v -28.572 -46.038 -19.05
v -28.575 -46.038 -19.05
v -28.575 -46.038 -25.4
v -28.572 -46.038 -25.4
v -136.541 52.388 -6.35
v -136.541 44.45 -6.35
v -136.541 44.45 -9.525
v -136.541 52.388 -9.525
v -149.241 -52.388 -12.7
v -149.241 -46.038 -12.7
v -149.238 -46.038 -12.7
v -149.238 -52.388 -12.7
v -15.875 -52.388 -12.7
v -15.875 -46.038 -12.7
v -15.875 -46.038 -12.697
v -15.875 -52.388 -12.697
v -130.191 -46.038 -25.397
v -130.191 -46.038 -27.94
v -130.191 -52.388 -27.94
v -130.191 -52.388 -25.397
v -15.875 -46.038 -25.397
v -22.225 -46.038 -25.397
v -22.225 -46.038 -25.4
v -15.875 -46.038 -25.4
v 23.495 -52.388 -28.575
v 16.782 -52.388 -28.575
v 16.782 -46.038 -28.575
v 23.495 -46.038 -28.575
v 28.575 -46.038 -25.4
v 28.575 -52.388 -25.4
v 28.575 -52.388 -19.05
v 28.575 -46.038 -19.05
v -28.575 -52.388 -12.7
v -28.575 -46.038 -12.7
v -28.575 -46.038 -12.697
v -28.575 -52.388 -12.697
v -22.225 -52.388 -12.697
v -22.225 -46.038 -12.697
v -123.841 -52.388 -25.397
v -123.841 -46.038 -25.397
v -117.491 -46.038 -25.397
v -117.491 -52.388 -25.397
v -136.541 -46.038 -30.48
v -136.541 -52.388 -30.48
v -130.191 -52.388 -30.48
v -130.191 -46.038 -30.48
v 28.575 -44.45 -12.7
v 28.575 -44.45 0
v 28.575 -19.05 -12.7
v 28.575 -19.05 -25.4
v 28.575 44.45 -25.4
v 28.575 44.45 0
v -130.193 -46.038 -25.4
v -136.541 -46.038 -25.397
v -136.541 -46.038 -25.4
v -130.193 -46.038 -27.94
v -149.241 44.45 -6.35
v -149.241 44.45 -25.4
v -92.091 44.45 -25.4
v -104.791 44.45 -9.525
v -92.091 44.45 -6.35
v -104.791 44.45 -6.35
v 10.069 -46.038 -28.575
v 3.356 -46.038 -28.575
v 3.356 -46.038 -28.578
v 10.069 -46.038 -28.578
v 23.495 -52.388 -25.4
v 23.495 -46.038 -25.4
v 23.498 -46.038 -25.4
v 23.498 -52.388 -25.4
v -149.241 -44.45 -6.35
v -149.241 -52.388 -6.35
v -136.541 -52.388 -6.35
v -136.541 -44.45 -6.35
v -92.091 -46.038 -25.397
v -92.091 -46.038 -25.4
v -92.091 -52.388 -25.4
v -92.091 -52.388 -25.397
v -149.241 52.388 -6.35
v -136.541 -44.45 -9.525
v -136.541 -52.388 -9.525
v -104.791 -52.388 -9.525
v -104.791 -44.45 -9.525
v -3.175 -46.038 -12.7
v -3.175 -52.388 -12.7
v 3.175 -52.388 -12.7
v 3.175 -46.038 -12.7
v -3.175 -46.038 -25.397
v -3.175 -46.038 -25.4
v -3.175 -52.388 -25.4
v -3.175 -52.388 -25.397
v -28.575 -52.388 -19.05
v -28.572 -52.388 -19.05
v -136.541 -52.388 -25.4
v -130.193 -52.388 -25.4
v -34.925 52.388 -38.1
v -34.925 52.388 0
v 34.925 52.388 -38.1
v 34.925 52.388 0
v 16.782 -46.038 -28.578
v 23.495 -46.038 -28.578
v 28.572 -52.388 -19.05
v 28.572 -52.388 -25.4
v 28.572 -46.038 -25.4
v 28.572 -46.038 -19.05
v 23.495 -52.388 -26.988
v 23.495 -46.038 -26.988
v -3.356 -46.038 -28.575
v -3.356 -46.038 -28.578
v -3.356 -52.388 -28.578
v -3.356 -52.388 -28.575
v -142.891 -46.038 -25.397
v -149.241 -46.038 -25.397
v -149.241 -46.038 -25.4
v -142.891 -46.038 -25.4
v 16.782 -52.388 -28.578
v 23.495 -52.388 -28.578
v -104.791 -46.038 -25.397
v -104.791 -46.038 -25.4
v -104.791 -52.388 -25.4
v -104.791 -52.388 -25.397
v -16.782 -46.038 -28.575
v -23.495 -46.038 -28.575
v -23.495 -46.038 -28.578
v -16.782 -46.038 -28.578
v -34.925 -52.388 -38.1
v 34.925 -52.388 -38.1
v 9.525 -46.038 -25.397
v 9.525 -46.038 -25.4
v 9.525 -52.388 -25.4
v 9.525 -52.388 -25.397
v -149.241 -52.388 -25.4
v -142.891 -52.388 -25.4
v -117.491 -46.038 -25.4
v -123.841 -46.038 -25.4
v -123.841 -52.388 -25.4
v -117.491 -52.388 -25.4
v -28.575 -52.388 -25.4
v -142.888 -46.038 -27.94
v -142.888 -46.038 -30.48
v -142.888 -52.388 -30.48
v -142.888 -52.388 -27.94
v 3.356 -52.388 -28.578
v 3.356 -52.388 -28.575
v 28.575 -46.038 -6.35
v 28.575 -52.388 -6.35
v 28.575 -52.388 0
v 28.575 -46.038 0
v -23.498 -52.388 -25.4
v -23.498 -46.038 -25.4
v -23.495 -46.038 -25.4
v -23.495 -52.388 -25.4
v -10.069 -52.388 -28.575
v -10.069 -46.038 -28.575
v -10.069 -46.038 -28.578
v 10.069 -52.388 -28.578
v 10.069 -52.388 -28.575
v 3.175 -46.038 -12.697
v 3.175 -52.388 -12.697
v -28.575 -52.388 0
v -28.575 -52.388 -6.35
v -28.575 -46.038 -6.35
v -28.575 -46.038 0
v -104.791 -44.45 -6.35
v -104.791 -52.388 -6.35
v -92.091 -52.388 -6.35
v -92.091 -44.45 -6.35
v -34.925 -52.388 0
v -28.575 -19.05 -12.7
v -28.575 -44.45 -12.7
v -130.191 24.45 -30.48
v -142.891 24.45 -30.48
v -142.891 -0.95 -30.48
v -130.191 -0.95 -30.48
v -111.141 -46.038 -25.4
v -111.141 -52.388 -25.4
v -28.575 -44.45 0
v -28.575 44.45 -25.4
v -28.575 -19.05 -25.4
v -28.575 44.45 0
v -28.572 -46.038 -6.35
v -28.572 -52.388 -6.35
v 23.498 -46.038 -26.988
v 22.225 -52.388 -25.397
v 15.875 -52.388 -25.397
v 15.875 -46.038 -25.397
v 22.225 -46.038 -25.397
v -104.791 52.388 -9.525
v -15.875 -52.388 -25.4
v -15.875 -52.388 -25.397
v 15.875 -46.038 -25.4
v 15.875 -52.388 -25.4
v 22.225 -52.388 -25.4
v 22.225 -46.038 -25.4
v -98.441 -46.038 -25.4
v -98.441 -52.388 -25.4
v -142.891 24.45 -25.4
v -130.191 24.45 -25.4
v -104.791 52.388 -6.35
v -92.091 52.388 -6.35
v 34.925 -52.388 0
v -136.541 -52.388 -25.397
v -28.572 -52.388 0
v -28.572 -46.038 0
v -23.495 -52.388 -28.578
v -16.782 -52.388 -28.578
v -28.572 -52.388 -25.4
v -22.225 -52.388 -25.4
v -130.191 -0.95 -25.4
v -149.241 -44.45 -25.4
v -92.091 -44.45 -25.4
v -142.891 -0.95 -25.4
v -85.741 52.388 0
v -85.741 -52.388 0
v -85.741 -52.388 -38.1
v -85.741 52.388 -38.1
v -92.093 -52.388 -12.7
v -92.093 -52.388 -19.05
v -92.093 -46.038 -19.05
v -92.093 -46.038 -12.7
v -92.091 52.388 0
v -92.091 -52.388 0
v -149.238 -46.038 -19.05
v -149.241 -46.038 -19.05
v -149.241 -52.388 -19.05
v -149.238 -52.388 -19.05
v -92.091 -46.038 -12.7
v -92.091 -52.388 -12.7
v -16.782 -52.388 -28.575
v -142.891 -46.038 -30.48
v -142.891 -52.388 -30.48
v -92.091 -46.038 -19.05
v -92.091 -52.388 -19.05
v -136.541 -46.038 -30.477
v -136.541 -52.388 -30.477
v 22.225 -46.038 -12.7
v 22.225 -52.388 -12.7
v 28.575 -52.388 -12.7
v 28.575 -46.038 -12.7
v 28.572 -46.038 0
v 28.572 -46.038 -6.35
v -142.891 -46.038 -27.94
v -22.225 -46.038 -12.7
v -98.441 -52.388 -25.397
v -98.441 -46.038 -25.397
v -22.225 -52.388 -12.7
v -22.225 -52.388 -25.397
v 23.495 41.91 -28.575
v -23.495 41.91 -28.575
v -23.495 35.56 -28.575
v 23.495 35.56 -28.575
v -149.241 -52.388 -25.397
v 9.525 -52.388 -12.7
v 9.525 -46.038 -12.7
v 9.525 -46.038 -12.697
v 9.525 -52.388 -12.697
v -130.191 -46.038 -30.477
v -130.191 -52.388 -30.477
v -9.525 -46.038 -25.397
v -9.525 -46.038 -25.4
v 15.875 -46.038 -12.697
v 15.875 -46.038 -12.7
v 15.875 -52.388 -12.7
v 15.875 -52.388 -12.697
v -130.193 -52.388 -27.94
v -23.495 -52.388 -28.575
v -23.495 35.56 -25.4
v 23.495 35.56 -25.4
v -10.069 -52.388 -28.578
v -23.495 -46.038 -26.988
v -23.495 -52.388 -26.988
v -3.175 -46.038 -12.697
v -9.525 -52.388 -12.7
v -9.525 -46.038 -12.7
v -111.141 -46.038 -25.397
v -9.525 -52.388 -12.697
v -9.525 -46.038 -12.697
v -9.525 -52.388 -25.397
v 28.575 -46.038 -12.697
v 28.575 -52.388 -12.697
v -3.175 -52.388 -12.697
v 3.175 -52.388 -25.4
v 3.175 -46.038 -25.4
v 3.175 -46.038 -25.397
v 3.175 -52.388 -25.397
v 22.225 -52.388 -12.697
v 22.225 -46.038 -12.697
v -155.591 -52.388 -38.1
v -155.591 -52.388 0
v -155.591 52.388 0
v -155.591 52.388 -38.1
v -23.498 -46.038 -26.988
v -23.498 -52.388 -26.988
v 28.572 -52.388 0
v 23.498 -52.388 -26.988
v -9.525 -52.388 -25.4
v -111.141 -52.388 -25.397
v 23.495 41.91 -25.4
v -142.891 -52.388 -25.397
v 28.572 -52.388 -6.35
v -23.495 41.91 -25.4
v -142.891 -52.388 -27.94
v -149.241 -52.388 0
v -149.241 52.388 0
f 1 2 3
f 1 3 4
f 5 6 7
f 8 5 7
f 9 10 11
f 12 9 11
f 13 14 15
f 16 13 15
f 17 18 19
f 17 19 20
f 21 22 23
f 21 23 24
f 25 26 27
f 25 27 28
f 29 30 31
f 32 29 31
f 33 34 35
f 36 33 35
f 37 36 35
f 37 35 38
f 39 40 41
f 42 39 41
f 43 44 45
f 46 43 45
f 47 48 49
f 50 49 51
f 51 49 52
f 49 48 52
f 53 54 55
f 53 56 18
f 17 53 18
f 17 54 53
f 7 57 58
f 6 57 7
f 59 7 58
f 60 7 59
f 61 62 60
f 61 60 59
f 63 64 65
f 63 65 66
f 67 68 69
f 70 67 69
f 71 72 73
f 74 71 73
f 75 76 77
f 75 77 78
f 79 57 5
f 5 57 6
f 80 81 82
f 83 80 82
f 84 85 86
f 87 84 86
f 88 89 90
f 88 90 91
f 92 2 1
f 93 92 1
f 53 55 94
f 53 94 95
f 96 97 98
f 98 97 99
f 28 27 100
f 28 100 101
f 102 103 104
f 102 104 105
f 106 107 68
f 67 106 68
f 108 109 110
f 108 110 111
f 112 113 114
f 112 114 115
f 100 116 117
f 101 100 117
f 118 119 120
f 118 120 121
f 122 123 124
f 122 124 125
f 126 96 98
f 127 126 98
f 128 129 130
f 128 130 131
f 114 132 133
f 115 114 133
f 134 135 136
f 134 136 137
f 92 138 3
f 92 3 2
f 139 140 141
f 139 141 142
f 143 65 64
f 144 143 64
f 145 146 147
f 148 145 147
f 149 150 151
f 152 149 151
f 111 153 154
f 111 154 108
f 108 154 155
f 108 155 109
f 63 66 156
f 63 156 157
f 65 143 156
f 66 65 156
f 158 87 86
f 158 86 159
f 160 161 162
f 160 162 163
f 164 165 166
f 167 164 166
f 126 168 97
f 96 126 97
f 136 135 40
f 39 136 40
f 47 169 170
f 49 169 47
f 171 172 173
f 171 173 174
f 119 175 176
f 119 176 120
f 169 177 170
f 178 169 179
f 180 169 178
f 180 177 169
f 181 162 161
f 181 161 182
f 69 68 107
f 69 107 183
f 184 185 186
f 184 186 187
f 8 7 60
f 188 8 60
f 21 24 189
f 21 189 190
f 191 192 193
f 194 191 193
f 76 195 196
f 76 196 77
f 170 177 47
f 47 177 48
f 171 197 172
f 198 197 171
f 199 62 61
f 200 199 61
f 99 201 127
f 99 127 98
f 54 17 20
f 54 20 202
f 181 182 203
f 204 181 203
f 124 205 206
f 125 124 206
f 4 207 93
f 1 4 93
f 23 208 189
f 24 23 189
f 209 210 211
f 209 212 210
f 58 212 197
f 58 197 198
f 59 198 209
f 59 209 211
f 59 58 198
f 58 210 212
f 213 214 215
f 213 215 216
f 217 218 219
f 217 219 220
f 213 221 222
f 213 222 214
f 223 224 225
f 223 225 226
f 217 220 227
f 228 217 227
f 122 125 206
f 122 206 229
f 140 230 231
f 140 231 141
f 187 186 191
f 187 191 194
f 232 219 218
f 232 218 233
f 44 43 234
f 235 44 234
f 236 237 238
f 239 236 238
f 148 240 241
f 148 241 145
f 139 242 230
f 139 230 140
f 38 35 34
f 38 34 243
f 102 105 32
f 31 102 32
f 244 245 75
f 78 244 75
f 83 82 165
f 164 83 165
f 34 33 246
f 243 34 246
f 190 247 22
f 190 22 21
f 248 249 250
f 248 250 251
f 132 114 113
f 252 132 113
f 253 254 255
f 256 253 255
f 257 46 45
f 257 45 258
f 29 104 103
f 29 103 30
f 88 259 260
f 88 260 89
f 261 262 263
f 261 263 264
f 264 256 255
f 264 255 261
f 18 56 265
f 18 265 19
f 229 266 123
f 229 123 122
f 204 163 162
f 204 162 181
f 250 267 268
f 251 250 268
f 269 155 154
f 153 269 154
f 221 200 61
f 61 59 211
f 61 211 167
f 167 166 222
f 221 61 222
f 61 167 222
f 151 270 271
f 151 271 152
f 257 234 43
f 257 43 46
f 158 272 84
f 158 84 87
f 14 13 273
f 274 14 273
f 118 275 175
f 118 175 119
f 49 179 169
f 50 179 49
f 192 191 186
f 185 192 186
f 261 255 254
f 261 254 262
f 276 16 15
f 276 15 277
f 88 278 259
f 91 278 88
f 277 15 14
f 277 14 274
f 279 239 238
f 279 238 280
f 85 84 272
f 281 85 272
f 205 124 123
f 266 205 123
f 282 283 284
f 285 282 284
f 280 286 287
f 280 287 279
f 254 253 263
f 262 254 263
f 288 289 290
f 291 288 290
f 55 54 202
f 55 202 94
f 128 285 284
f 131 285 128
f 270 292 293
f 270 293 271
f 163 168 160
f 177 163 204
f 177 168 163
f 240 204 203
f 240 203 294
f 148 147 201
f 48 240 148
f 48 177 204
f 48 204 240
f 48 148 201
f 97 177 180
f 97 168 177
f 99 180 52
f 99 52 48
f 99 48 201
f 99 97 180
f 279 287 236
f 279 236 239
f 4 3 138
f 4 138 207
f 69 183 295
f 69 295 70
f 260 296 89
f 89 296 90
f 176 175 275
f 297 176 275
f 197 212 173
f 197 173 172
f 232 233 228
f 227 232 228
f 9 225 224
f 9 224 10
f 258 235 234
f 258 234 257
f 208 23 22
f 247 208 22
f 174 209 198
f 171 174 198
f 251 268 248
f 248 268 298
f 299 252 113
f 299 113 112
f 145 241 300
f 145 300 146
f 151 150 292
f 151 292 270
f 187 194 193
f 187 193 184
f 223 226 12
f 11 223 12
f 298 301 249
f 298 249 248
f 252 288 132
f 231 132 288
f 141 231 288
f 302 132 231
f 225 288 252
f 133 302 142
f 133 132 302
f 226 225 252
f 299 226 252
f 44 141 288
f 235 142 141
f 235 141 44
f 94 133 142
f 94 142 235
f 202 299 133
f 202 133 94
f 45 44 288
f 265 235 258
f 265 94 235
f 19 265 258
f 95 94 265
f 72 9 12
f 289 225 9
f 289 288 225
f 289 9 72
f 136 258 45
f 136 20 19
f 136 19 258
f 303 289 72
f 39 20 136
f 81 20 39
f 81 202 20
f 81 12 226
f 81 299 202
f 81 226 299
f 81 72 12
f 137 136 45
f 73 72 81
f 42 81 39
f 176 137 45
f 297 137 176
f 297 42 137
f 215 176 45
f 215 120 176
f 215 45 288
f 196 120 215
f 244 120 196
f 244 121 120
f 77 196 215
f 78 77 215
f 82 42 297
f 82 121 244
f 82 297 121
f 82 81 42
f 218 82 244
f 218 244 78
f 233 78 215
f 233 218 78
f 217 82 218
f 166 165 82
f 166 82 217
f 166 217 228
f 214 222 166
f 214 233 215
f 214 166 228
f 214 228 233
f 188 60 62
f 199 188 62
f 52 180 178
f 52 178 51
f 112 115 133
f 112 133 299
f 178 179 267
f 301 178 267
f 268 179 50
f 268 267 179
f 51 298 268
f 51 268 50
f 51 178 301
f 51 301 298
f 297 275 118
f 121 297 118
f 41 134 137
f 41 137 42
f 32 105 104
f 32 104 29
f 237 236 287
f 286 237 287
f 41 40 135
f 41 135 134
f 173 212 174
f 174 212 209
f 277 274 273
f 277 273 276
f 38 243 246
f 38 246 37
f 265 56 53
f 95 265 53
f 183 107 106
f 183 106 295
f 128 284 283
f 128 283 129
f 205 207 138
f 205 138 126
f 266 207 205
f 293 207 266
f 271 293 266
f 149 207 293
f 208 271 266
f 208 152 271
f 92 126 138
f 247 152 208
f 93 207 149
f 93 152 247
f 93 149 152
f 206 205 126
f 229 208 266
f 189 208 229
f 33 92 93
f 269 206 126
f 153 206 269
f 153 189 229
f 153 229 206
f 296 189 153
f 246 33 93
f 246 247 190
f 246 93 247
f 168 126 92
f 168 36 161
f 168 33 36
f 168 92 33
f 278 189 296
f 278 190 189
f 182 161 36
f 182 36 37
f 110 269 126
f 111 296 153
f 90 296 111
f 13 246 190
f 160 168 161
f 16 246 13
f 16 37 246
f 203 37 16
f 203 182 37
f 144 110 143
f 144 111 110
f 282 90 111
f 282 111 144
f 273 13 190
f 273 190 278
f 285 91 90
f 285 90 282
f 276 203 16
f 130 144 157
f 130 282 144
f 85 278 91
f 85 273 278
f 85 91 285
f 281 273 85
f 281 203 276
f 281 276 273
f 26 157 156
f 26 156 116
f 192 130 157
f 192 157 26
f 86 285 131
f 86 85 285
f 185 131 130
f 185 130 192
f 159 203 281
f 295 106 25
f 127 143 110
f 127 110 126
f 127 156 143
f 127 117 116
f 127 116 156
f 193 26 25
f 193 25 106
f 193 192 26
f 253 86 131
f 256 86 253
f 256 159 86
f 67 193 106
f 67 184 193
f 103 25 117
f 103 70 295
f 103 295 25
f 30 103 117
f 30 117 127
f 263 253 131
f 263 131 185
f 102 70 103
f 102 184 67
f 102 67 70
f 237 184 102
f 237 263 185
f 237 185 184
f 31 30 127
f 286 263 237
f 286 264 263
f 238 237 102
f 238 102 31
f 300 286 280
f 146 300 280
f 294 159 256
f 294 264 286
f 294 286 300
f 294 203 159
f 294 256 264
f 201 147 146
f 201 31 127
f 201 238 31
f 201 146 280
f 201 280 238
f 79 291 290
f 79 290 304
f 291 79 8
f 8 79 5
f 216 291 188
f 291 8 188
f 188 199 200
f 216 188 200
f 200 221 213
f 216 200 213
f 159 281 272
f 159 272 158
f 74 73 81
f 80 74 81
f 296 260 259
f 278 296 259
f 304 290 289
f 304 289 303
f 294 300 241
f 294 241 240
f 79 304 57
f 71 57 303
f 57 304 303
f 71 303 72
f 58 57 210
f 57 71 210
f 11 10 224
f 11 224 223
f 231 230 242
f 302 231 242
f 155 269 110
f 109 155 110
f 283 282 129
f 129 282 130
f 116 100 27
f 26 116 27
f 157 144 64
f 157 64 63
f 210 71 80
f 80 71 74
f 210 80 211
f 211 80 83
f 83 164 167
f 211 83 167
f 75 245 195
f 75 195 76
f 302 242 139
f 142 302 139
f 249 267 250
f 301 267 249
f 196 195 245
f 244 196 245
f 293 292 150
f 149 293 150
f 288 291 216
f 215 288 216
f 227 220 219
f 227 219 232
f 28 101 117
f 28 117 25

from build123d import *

# Parameters (mm, degrees)
F0_W      = 69.85
F0_H      = 104.775
F1_DEPTH  = 38.1
F2_W      = 57.15
F2_H      = 88.9
F3_DEPTH  = 25.4
F4_W      = 57.15
F4_H      = 25.4
F5_DEPTH  = 12.7
F6_DEPTH  = 25.4
F8_DEPTH  = 104.776
F9_W      = 12.7
F9_H      = 25.4
F10_DEPTH = 5.08
F11_W     = 46.99
F11_H     = 6.35
F12_DEPTH = 3.175
F13_W     = 6.35
F13_H     = 0.00254
F13_W_2   = 0.00254
F13_H_2   = 6.35
F13_H_3   = 1.5875
F13_W_3   = 6.7128571429
F14_DEPTH = 6.35
F15_W     = 6.35
F15_H     = 0.00254
F15_W_2   = 0.00254
F15_H_2   = 2.54
F15_H_3   = 6.35
F16_DEPTH = 6.35
F17_DEPTH = 6.35


with BuildPart() as f1:
    # F0 (on Top) → F1 (new body)
    with BuildSketch(Plane.XY):
        Rectangle(F0_W, F0_H)
    extrude(amount=-F1_DEPTH)

    # F2 (on Top) → F3 (cut)
    with BuildSketch(Plane.XY):
        Rectangle(F2_W, F2_H)
    extrude(amount=-F3_DEPTH, mode=Mode.SUBTRACT)

    # F4 (on face) → F5 (join)
    with BuildSketch(Plane.XY.offset(-25.4)):
        with Locations((0, -31.75)):
            Rectangle(F4_W, F4_H)
    extrude(amount=F5_DEPTH)

    # F11 (on face) → F12 (cut)
    with BuildSketch(Plane.XY.offset(-25.4)):
        with Locations((0, 38.735)):
            Rectangle(F11_W, F11_H)
    extrude(amount=-F12_DEPTH, mode=Mode.SUBTRACT)

    # F13 (on face) → F14 (cut)
    with BuildSketch(Plane.XZ.offset(52.3875)):
        with Locations((-25.4, -12.69873)):
            Rectangle(F13_W, F13_H)
        with Locations((-12.7, -12.69873)):
            Rectangle(F13_W, F13_H)
        with Locations((0, -12.69873)):
            Rectangle(F13_W, F13_H)
        with Locations((12.7, -12.69873)):
            Rectangle(F13_W, F13_H)
        with Locations((25.4, -12.69873)):
            Rectangle(F13_W, F13_H)
        with Locations((-28.57373, -3.175)):
            Rectangle(F13_W_2, F13_H_2)
        with Locations((-28.57373, -22.225)):
            Rectangle(F13_W_2, F13_H_2)
        with Locations((28.57373, -3.175)):
            Rectangle(F13_W_2, F13_H_2)
        with Locations((28.57373, -22.225)):
            Rectangle(F13_W_2, F13_H_2)
        with Locations((-19.05, -25.39873)):
            Rectangle(F13_W, F13_H)
        with Locations((-6.35, -25.39873)):
            Rectangle(F13_W, F13_H)
        with Locations((6.35, -25.39873)):
            Rectangle(F13_W, F13_H)
        with Locations((19.05, -25.39873)):
            Rectangle(F13_W, F13_H)
        with Locations((-23.49627, -26.19375)):
            Rectangle(F13_W_2, F13_H_3)
        with Locations((23.49627, -26.19375)):
            Rectangle(F13_W_2, F13_H_3)
        with Locations((20.1385714286, -28.57627)):
            Rectangle(F13_W_3, F13_H)
        with Locations((6.7128571429, -28.57627)):
            Rectangle(F13_W_3, F13_H)
        with Locations((-6.7128571429, -28.57627)):
            Rectangle(F13_W_3, F13_H)
        with Locations((-20.1385714286, -28.57627)):
            Rectangle(F13_W_3, F13_H)
    extrude(amount=-F14_DEPTH, mode=Mode.SUBTRACT)

    # F13 (on face) → F17 (cut)
    with BuildSketch(Plane.XZ.offset(52.3875)):
        with Locations((-25.4, -12.69873)):
            Rectangle(F13_W, F13_H)
        with Locations((-12.7, -12.69873)):
            Rectangle(F13_W, F13_H)
        with Locations((0, -12.69873)):
            Rectangle(F13_W, F13_H)
        with Locations((12.7, -12.69873)):
            Rectangle(F13_W, F13_H)
        with Locations((25.4, -12.69873)):
            Rectangle(F13_W, F13_H)
        with Locations((-28.57373, -3.175)):
            Rectangle(F13_W_2, F13_H_2)
        with Locations((-28.57373, -22.225)):
            Rectangle(F13_W_2, F13_H_2)
        with Locations((28.57373, -3.175)):
            Rectangle(F13_W_2, F13_H_2)
        with Locations((28.57373, -22.225)):
            Rectangle(F13_W_2, F13_H_2)
        with Locations((-19.05, -25.39873)):
            Rectangle(F13_W, F13_H)
        with Locations((-6.35, -25.39873)):
            Rectangle(F13_W, F13_H)
        with Locations((6.35, -25.39873)):
            Rectangle(F13_W, F13_H)
        with Locations((19.05, -25.39873)):
            Rectangle(F13_W, F13_H)
        with Locations((-23.49627, -26.19375)):
            Rectangle(F13_W_2, F13_H_3)
        with Locations((23.49627, -26.19375)):
            Rectangle(F13_W_2, F13_H_3)
        with Locations((20.1385714286, -28.57627)):
            Rectangle(F13_W_3, F13_H)
        with Locations((6.7128571429, -28.57627)):
            Rectangle(F13_W_3, F13_H)
        with Locations((-6.7128571429, -28.57627)):
            Rectangle(F13_W_3, F13_H)
        with Locations((-20.1385714286, -28.57627)):
            Rectangle(F13_W_3, F13_H)
    extrude(amount=-F17_DEPTH, mode=Mode.SUBTRACT)


with BuildPart() as f1b:
    # F0 (on Top) → F1, piece 2 (new body)
    with BuildSketch(Plane.XY):
        with Locations((-120.6659083736, 0)):
            Rectangle(F0_W, F0_H)
    extrude(amount=-F1_DEPTH)

    # F2 (on Top) → F6 (cut)
    with BuildSketch(Plane.XY):
        Rectangle(F2_W, F2_H)
        with Locations((-120.6659083736, 0)):
            Rectangle(F2_W, F2_H)
    extrude(amount=-F6_DEPTH, mode=Mode.SUBTRACT)

    # F7 (on face) → F8 (cut, through all)
    with BuildSketch(Plane.XZ.offset(52.3875)):
        Polygon((-92.0909083736, 0), (-149.2409083736, 0), (-149.2409083736, -6.35), (-136.5409083736, -6.35), (-136.5409083736, -9.525), (-104.7909083736, -9.525), (-104.7909083736, -6.35), (-92.0909083736, -6.35), align=None)
    extrude(amount=-F8_DEPTH, mode=Mode.SUBTRACT)

    # F9 (on face) → F10 (cut)
    with BuildSketch(Plane.XY.offset(-25.4)):
        with Locations((-136.5409083736, 11.75)):
            Rectangle(F9_W, F9_H)
    extrude(amount=-F10_DEPTH, mode=Mode.SUBTRACT)

    # F15 (on face) → F16 (cut)
    with BuildSketch(Plane.XZ.offset(52.3875)):
        with Locations((-146.0659083736, -25.39873)):
            Rectangle(F15_W, F15_H)
        Polygon((-136.5409083736, -25.39746), (-136.5409083736, -25.4), (-130.1934483736, -25.4), (-130.1909083736, -25.4), (-130.1909083736, -25.39746), align=None)
        with Locations((-130.1921783736, -26.67)):
            Rectangle(F15_W_2, F15_H_2)
        with Locations((-120.6659083736, -25.39873)):
            Rectangle(F15_W, F15_H)
        with Locations((-107.9659083736, -25.39873)):
            Rectangle(F15_W, F15_H)
        with Locations((-95.2659083736, -25.39873)):
            Rectangle(F15_W, F15_H)
        with Locations((-142.8896383736, -29.21)):
            Rectangle(F15_W_2, F15_H_2)
        with Locations((-133.3659083736, -30.47873)):
            Rectangle(F15_W, F15_H)
        with Locations((-149.2396383736, -15.875)):
            Rectangle(F15_W_2, F15_H_3)
        with Locations((-92.0921783736, -15.875)):
            Rectangle(F15_W_2, F15_H_3)
    extrude(amount=-F16_DEPTH, mode=Mode.SUBTRACT)


solid = Compound([f1.part, f1b.part])
